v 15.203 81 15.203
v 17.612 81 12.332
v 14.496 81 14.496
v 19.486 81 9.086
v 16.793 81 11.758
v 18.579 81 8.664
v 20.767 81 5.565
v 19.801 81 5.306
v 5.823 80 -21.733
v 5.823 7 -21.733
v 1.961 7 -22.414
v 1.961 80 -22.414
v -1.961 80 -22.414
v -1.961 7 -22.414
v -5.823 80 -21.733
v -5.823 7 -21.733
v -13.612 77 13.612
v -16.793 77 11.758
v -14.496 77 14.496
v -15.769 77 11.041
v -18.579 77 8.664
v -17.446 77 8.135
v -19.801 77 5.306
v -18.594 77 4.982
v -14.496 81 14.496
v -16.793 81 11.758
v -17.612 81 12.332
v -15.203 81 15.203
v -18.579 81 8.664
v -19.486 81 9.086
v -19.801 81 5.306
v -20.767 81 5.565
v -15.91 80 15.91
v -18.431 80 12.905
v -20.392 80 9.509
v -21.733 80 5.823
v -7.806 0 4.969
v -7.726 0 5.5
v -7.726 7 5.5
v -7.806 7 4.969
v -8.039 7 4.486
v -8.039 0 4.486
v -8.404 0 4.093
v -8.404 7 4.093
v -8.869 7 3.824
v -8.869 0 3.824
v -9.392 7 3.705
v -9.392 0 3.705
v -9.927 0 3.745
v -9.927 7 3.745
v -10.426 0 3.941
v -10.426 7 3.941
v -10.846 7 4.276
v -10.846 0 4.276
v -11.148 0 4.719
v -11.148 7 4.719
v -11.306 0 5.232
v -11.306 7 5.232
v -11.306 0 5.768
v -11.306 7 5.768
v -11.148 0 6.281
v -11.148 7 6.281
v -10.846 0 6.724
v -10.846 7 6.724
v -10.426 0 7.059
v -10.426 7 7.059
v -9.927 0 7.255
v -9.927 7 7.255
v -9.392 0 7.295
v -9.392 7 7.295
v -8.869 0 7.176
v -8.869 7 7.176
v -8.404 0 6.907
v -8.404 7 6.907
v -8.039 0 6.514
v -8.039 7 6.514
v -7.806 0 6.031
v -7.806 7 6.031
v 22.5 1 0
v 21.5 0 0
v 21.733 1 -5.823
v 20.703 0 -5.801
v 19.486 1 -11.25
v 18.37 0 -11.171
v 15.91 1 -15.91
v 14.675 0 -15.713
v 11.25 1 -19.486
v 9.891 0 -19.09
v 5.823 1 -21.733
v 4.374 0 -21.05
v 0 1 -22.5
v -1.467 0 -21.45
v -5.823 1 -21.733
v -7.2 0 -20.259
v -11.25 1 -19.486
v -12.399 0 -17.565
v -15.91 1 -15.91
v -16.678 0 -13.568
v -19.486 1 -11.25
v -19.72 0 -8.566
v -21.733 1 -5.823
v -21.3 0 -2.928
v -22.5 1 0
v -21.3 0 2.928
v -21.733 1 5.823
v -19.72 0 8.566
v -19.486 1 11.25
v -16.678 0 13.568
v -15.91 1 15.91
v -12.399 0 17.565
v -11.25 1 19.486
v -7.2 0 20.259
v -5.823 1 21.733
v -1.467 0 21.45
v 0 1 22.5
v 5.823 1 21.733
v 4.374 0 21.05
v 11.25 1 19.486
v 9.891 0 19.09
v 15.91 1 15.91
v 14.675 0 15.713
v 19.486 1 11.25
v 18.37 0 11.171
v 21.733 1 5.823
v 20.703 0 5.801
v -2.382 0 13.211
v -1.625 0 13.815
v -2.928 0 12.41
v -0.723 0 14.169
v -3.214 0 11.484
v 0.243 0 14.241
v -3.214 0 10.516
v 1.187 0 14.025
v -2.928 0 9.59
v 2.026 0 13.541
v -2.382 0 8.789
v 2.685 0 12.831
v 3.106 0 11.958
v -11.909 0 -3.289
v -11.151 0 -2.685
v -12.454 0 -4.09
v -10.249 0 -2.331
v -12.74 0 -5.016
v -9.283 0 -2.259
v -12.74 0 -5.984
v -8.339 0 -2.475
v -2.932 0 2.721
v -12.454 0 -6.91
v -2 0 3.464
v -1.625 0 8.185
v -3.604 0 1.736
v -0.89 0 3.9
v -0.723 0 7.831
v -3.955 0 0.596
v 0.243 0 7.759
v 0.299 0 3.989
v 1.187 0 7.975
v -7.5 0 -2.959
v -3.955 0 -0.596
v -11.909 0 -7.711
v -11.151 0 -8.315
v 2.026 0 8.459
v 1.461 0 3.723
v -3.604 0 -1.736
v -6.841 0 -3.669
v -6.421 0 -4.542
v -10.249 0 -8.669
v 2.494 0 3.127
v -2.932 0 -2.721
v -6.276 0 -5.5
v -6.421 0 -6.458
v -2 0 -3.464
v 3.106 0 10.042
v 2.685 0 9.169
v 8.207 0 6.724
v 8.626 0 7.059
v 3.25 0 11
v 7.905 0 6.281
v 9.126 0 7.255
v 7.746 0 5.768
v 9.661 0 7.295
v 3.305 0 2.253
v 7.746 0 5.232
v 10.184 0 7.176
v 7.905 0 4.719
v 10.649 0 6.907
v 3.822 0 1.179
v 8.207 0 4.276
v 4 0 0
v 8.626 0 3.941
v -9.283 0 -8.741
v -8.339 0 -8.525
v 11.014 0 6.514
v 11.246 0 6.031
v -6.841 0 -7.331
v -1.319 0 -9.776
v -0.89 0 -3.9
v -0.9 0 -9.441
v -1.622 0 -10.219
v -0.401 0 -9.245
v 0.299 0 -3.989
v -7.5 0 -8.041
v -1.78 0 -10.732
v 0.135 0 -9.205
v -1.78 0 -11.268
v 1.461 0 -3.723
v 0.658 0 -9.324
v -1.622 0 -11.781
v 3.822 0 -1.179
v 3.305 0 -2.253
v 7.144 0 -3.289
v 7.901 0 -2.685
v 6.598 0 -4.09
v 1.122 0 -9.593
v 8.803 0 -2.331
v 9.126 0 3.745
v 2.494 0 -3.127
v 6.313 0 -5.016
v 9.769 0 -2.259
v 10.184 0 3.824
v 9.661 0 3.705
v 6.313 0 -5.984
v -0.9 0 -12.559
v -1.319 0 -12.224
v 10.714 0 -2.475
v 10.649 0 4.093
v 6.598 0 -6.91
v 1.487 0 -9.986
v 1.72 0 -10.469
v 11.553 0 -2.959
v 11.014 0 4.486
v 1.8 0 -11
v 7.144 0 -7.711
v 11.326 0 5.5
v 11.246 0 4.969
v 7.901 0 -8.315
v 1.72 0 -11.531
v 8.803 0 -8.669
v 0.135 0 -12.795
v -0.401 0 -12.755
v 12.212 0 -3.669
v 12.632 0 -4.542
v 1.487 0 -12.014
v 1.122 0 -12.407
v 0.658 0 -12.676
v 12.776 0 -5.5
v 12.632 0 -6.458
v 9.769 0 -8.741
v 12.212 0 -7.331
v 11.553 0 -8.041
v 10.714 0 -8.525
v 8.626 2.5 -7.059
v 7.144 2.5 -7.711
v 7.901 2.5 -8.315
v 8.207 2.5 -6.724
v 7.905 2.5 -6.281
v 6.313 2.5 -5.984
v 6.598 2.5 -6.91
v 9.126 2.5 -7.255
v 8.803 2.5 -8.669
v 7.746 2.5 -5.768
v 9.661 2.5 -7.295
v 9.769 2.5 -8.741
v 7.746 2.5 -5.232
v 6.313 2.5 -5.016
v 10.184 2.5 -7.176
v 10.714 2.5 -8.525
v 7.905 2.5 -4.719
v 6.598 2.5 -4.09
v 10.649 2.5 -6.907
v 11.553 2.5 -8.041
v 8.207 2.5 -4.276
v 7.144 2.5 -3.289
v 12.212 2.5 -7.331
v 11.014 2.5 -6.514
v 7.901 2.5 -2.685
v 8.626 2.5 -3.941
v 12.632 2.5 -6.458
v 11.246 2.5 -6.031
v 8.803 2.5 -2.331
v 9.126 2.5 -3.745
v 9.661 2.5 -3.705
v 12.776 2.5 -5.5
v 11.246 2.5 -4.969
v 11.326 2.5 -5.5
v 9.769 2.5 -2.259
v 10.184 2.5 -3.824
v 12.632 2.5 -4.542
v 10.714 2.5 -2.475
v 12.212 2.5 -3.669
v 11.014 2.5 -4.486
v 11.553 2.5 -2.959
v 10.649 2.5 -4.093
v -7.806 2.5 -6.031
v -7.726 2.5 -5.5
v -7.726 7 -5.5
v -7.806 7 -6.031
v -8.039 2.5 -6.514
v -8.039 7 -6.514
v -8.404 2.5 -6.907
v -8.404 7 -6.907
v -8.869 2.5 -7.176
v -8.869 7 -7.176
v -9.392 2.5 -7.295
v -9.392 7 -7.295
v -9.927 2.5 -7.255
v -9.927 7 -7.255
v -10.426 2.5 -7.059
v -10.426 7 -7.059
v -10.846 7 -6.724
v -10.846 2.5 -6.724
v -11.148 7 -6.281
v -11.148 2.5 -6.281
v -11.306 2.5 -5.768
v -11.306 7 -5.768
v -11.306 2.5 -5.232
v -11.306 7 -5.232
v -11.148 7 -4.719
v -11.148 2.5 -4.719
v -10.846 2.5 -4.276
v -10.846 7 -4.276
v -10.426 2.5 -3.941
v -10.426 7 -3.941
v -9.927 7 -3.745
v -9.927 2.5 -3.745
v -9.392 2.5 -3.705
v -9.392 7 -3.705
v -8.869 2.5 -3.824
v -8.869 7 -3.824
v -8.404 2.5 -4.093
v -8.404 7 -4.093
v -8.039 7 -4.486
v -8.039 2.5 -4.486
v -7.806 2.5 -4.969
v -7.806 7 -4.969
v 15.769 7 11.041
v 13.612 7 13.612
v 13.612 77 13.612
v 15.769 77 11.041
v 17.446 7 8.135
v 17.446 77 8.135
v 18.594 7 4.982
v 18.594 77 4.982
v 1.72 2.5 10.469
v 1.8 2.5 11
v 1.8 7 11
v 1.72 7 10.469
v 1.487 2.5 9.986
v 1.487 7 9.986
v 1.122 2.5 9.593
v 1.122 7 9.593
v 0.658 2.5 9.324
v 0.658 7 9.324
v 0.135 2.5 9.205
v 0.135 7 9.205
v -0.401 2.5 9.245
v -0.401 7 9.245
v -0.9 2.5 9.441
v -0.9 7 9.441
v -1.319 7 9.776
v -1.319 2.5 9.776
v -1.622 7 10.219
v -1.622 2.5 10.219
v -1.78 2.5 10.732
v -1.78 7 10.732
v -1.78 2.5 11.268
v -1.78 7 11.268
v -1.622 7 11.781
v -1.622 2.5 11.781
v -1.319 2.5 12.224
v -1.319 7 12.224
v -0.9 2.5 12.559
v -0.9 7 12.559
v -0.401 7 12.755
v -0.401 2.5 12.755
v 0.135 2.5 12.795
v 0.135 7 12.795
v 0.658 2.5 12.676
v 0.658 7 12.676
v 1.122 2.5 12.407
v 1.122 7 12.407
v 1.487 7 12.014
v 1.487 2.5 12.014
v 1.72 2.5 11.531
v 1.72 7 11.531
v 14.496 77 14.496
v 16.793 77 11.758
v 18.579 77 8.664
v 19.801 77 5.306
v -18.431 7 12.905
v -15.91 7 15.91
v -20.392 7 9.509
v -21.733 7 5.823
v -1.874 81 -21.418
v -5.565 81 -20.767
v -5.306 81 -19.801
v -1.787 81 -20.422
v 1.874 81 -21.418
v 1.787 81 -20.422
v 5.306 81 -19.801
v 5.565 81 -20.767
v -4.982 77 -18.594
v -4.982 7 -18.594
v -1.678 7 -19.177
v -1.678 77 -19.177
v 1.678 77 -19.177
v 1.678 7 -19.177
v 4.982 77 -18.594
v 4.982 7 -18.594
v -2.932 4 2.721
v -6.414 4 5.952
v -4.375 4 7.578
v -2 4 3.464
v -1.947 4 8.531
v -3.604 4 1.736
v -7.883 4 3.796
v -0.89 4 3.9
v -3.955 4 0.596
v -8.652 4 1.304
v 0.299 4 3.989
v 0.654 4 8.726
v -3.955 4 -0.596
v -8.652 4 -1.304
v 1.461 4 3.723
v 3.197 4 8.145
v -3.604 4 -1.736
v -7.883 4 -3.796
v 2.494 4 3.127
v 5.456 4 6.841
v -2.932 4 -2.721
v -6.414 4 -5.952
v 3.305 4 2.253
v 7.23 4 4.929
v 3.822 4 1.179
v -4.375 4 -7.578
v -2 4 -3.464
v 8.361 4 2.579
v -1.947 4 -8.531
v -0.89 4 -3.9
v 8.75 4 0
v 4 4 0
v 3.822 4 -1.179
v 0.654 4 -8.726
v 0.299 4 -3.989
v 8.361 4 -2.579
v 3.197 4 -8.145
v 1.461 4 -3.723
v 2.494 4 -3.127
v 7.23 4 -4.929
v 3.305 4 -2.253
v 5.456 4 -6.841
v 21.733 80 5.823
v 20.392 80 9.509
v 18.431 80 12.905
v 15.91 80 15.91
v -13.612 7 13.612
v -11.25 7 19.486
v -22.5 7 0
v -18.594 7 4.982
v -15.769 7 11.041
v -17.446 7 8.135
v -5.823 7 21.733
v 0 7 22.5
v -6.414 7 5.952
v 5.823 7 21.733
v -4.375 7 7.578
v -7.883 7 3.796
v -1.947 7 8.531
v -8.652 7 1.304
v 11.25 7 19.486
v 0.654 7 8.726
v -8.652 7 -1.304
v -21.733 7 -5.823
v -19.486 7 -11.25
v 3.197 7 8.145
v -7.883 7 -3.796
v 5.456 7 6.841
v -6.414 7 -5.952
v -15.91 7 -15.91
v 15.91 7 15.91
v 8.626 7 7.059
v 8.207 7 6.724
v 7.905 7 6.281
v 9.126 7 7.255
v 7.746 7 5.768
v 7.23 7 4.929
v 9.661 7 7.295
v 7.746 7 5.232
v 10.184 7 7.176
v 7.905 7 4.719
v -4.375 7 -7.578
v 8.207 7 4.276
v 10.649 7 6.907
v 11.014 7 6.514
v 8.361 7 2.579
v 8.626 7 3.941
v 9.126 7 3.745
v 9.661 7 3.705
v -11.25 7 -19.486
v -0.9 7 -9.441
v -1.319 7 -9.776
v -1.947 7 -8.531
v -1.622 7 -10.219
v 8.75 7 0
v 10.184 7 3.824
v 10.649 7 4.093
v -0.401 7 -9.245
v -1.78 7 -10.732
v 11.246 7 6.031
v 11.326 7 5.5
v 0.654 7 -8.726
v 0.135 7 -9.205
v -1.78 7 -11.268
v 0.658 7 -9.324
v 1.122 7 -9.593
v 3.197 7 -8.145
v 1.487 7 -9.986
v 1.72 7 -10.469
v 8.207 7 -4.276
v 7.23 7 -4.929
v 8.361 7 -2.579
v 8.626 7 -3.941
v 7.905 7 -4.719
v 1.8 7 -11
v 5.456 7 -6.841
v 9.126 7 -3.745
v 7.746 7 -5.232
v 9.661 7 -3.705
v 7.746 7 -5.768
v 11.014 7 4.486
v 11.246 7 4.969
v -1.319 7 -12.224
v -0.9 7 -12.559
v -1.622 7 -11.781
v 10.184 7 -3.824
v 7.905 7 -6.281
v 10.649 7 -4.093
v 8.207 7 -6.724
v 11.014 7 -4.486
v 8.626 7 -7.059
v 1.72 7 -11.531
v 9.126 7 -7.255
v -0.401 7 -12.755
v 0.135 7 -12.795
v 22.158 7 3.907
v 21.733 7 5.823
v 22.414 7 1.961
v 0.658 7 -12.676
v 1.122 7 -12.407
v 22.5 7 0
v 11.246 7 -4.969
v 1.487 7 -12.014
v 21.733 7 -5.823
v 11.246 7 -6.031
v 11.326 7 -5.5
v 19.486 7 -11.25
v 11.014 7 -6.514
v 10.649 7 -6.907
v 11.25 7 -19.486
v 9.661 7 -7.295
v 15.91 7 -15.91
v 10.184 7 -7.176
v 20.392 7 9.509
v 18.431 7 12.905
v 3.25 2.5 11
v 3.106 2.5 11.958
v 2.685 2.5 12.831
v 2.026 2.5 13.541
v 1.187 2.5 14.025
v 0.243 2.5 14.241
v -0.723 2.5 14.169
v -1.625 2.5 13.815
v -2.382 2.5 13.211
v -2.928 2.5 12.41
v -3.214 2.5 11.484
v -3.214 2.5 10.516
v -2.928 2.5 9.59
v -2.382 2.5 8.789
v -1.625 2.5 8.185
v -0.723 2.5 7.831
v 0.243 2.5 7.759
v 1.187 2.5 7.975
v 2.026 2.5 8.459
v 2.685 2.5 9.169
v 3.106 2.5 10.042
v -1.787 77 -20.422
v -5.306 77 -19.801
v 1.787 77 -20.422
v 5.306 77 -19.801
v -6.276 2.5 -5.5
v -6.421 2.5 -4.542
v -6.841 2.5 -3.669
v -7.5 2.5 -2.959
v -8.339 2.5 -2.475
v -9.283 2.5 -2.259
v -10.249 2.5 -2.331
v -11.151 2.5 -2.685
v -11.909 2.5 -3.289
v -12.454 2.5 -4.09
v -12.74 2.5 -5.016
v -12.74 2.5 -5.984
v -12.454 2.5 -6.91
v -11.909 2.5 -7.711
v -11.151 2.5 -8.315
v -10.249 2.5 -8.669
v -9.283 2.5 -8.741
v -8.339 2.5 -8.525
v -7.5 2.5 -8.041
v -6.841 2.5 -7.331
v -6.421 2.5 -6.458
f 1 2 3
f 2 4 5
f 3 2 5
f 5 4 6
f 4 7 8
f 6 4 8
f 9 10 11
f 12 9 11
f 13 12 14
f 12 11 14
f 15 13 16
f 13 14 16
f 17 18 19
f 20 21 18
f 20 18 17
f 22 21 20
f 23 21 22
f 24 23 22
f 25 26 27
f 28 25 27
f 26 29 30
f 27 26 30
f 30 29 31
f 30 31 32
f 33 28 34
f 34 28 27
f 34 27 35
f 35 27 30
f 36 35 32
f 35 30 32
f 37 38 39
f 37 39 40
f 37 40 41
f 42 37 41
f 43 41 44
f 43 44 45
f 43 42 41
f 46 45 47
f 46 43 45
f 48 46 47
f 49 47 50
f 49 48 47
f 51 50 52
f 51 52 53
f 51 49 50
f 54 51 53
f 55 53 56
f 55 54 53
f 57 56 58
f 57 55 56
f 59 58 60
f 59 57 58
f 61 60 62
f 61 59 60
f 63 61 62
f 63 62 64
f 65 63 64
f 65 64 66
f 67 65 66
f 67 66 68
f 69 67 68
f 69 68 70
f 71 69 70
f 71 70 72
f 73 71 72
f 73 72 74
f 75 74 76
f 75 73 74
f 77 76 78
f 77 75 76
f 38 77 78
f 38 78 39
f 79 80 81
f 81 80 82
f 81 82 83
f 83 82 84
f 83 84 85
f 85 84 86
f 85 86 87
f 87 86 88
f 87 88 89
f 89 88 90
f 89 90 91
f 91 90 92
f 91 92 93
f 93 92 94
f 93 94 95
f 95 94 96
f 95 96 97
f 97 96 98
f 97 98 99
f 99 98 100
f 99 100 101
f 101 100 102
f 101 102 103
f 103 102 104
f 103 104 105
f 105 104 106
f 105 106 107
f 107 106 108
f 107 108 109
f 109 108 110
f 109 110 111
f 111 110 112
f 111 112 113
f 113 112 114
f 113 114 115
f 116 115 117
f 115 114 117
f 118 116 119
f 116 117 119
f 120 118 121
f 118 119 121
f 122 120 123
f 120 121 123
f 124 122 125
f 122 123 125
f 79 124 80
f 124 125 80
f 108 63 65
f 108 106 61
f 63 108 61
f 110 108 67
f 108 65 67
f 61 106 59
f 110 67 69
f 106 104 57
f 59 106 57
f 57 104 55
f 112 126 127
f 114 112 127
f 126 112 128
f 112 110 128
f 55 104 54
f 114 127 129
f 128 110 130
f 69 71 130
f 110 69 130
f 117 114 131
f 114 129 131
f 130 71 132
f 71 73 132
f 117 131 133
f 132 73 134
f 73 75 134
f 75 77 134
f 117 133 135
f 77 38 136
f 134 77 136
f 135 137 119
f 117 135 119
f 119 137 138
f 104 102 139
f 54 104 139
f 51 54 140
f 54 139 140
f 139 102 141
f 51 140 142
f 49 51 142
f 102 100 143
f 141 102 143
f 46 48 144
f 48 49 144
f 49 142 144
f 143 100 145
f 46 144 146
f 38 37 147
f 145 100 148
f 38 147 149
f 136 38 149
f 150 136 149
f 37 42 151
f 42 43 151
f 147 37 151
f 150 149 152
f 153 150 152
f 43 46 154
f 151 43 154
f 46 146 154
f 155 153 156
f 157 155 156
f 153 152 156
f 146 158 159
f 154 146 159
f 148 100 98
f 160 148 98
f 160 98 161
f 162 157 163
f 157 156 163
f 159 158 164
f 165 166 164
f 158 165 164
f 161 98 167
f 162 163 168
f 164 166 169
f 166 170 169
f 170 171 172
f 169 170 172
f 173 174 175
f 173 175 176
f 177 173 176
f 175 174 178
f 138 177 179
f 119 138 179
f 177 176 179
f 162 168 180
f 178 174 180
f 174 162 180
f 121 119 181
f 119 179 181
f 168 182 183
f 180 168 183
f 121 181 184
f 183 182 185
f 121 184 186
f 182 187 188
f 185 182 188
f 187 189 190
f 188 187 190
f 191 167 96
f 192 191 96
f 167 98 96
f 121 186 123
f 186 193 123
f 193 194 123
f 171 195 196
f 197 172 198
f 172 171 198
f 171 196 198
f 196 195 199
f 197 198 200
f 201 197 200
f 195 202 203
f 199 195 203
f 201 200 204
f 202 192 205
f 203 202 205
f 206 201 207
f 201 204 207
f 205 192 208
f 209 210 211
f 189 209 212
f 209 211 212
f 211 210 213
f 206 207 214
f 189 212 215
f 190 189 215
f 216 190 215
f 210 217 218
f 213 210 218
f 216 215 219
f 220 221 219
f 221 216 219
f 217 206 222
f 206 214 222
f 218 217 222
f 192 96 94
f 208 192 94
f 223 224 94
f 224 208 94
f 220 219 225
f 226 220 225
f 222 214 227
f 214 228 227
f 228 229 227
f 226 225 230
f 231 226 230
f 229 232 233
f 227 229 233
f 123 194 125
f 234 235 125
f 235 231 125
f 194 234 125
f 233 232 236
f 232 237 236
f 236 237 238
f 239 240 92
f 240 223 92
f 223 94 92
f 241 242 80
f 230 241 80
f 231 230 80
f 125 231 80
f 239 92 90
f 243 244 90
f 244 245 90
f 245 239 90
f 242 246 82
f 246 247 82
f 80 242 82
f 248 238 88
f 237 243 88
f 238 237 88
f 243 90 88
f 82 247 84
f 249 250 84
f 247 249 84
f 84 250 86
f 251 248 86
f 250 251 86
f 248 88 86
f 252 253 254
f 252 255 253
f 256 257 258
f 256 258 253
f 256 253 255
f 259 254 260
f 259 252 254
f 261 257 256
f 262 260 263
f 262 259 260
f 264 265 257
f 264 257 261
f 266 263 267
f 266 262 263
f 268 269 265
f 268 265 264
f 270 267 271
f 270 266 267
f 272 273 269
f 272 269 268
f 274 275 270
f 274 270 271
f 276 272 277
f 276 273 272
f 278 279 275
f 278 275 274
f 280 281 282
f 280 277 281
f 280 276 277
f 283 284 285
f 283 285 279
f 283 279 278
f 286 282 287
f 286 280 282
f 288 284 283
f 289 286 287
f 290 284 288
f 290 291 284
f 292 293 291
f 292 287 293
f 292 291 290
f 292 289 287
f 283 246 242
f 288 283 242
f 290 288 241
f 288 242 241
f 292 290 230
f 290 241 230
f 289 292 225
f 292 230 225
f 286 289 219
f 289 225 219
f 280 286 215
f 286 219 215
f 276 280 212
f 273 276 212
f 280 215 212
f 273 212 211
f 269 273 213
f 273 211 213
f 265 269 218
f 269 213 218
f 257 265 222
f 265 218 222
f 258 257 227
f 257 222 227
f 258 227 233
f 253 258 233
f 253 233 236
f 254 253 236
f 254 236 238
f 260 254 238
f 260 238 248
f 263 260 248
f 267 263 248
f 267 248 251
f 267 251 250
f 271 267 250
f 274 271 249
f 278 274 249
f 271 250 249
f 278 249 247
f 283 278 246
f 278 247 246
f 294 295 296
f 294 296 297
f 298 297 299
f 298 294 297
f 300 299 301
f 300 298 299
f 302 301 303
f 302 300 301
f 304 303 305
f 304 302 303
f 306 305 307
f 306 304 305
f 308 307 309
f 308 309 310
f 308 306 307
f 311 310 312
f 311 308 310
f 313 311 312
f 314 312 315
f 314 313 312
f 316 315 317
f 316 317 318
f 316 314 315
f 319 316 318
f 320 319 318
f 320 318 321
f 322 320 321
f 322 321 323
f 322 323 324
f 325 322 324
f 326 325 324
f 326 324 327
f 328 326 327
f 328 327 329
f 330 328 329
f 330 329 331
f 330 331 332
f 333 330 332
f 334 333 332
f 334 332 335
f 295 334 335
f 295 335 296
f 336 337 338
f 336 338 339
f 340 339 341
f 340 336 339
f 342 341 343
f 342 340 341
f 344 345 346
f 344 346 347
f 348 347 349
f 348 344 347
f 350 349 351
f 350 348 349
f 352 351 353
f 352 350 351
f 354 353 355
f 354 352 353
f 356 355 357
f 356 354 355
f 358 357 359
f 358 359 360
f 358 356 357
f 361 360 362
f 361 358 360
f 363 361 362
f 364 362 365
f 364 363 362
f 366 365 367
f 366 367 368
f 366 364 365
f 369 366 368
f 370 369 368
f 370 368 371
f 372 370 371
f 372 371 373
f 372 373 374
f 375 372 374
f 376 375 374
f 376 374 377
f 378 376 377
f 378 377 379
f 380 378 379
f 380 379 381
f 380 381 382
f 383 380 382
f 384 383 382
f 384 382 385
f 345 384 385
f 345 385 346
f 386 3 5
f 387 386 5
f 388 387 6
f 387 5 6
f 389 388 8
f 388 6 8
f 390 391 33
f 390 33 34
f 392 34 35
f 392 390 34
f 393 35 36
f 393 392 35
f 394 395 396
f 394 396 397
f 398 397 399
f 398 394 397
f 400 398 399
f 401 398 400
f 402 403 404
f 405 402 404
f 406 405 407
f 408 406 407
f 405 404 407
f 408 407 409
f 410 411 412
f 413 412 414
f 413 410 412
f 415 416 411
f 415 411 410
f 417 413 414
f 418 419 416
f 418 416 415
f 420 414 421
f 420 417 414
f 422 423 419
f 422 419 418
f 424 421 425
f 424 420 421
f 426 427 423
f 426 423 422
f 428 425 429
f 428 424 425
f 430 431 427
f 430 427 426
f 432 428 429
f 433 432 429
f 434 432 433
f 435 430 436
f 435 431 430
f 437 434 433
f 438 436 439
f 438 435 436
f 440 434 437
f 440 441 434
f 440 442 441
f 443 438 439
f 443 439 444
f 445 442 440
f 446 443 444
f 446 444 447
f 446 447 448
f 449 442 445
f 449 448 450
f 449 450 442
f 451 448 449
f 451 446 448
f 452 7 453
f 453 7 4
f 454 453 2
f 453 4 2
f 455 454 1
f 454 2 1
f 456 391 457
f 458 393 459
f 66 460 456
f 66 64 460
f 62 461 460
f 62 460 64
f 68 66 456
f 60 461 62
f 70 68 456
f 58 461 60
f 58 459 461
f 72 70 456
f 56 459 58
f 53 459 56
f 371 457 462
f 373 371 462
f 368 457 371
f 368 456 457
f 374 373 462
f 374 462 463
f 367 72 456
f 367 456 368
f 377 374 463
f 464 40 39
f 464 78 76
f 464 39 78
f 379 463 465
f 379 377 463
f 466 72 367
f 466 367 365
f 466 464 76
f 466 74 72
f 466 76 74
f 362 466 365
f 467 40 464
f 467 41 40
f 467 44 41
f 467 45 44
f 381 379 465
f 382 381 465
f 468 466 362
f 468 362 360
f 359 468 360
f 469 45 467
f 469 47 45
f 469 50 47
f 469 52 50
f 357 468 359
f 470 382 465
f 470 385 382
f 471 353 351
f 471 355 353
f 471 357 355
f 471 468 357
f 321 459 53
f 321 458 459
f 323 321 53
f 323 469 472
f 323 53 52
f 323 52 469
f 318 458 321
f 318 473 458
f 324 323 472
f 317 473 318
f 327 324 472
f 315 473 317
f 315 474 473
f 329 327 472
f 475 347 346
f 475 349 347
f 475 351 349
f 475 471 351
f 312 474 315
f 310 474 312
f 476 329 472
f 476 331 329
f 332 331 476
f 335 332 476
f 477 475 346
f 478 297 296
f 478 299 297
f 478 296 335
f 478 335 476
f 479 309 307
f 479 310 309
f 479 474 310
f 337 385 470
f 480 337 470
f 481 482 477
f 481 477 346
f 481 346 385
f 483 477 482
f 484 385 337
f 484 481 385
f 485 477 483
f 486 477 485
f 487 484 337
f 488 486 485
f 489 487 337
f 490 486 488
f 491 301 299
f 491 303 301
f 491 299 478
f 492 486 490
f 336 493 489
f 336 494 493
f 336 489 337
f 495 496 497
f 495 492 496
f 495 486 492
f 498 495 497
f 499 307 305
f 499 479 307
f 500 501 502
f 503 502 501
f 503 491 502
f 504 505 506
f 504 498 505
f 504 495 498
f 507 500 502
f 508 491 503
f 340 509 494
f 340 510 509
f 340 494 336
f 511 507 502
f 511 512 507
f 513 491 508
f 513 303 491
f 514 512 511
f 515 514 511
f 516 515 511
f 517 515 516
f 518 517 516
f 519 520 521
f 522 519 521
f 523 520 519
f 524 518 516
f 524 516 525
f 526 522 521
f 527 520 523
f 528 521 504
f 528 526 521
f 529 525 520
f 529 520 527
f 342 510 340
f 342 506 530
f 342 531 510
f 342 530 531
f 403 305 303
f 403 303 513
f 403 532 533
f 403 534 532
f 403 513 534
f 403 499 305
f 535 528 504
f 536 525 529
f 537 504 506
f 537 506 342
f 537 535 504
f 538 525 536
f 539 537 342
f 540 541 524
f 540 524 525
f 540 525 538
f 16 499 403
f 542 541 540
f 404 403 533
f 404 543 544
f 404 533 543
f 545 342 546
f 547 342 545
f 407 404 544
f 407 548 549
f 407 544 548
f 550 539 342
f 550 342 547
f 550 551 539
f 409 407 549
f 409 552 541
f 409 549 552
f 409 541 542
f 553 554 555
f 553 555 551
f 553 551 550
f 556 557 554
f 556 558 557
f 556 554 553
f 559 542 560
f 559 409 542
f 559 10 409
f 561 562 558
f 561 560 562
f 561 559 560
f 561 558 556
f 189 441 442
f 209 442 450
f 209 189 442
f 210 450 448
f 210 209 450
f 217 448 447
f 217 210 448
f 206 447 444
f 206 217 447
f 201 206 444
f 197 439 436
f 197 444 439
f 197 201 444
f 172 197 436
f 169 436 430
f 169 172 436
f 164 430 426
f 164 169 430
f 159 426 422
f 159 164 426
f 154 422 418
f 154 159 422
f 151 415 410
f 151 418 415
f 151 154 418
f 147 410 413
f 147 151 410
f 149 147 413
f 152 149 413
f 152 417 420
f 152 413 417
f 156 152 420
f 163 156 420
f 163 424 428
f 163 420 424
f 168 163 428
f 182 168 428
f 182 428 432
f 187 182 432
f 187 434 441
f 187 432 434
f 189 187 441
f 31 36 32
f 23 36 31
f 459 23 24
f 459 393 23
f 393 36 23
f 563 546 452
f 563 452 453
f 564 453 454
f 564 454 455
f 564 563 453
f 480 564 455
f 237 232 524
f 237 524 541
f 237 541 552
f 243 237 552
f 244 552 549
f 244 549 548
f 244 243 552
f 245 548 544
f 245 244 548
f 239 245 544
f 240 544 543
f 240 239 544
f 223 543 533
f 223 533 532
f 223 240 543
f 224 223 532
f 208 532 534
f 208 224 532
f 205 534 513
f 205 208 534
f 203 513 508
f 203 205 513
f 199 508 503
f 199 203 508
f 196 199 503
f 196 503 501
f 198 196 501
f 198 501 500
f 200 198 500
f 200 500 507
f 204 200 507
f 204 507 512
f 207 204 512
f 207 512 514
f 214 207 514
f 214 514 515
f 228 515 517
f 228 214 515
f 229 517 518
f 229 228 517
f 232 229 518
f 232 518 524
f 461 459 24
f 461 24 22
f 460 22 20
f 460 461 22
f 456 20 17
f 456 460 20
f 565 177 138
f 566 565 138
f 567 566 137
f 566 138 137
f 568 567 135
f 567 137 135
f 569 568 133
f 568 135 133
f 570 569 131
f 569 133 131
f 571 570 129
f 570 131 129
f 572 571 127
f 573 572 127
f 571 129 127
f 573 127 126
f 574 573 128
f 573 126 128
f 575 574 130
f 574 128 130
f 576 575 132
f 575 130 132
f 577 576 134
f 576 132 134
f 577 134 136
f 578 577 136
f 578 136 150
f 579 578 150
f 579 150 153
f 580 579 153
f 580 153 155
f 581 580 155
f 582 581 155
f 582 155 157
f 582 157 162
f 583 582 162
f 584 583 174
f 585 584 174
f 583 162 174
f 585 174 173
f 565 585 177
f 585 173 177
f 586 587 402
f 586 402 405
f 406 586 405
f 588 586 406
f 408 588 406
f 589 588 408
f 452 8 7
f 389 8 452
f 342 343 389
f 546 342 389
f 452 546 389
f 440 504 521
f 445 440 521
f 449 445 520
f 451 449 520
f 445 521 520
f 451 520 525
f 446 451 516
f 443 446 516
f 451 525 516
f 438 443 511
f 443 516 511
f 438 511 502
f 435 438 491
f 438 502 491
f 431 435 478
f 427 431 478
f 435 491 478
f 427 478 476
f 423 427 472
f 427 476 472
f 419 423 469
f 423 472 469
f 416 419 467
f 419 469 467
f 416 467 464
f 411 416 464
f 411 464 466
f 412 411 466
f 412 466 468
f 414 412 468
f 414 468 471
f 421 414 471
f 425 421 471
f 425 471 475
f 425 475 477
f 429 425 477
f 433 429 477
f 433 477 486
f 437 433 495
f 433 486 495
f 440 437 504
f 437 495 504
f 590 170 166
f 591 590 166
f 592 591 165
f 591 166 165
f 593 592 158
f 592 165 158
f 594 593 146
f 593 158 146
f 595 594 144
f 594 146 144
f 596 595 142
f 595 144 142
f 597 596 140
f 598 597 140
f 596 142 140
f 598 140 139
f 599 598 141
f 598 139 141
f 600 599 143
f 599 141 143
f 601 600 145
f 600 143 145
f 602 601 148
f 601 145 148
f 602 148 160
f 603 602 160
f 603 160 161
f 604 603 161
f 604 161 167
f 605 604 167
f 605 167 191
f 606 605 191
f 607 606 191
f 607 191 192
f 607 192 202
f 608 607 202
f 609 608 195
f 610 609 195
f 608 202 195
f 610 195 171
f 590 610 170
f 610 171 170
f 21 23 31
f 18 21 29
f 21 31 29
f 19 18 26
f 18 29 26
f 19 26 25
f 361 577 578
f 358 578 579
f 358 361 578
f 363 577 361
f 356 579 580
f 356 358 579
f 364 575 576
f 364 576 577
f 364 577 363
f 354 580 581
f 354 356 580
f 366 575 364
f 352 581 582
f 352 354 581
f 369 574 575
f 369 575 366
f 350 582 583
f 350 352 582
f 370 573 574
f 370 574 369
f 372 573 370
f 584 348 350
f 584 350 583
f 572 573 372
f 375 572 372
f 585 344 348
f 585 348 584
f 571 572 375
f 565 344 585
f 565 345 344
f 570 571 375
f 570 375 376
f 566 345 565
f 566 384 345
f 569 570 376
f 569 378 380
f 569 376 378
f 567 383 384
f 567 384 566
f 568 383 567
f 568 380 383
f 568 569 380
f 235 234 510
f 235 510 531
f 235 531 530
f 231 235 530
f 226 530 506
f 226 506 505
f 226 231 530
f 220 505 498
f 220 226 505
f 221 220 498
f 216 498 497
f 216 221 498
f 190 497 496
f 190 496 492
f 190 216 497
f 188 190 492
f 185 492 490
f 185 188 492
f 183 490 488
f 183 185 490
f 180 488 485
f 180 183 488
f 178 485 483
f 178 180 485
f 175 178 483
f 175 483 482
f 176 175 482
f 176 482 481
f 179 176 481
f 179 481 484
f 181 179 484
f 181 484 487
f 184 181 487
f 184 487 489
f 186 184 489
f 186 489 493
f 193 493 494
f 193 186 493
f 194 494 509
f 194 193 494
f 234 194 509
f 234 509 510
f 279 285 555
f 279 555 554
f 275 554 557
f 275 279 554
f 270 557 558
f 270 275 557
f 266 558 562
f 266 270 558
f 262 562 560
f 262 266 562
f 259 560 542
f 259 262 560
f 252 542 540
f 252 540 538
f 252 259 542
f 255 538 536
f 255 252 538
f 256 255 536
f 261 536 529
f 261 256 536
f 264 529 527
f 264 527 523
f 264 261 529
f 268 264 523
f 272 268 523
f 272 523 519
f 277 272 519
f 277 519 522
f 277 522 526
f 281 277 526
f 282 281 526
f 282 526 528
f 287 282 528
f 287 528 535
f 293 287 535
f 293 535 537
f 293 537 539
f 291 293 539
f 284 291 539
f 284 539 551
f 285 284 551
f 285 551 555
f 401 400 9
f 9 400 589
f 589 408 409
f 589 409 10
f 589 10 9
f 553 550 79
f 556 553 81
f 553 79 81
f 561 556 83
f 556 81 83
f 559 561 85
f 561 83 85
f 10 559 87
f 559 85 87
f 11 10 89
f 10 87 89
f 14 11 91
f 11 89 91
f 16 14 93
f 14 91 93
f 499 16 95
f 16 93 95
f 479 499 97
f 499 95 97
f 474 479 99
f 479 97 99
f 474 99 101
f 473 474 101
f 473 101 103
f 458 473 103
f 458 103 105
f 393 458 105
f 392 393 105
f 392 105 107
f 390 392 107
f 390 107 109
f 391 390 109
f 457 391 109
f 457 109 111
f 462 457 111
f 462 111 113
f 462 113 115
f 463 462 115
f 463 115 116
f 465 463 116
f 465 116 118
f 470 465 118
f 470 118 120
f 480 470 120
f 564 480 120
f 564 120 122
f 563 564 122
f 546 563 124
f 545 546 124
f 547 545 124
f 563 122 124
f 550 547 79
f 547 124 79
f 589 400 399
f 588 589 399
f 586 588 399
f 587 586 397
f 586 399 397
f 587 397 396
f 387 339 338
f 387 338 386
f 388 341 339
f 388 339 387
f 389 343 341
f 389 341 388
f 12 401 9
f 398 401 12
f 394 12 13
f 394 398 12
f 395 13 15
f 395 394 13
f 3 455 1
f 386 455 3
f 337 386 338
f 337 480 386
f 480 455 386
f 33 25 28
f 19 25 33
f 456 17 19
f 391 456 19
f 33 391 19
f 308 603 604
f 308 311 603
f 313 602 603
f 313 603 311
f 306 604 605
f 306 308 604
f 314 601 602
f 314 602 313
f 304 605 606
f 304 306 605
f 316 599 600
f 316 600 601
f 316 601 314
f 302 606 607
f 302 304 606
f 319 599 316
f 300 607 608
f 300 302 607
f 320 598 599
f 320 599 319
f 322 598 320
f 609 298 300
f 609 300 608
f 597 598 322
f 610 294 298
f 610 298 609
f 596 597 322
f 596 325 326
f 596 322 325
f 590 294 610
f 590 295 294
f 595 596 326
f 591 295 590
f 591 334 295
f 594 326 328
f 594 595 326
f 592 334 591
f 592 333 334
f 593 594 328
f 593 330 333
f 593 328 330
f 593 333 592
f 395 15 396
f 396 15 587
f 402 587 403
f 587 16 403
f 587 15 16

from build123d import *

# Parameters (mm, degrees)
SKETCH1_R           = 22.5
SKETCH1_R_2         = 1.8
SKETCH1_R_3         = 4
BOSS_EXTRUDE1_DEPTH = 7
SKETCH4_R           = 8.75
CUT_EXTRUDE2_DEPTH  = 3
SKETCH6_R           = 3.25
CUT_EXTRUDE3_DEPTH  = 2.5
BOSS_EXTRUDE2_DEPTH = 74
SKETCH7_R           = 20.5
CUT_EXTRUDE4_DEPTH  = 4
CHAMFER2_SIZE       = 1


with BuildPart() as part:
    # Sketch1 → Boss-Extrude1 (new body)
    with BuildSketch(Plane(origin=(0, 0, 0), x_dir=(1, 0, 0), z_dir=(0, 1, 0))):
        Circle(SKETCH1_R)
        with Locations((0, 11)):
            Circle(SKETCH1_R_2, mode=Mode.SUBTRACT)
        with Locations((9.526279442, 5.5)):
            Circle(SKETCH1_R_2, mode=Mode.SUBTRACT)
        with Locations((9.526279442, -5.5)):
            Circle(SKETCH1_R_2, mode=Mode.SUBTRACT)
        with Locations((0, -11)):
            Circle(SKETCH1_R_2, mode=Mode.SUBTRACT)
        with Locations((-9.526279442, -5.5)):
            Circle(SKETCH1_R_2, mode=Mode.SUBTRACT)
        with Locations((-9.526279442, 5.5)):
            Circle(SKETCH1_R_2, mode=Mode.SUBTRACT)
        Circle(SKETCH1_R_3, mode=Mode.SUBTRACT)
    extrude(amount=BOSS_EXTRUDE1_DEPTH)

    # Sketch4 → Cut-Extrude2 (cut)
    with BuildSketch(Plane(origin=(0, 7, 0), x_dir=(1, 0, 0), z_dir=(0, 1, 0))):
        Circle(SKETCH4_R)
    extrude(amount=-CUT_EXTRUDE2_DEPTH, mode=Mode.SUBTRACT)

    # Sketch6 → Cut-Extrude3 (cut)
    with BuildSketch(Plane.XZ):
        with Locations((0, 11)):
            Circle(SKETCH6_R)
        with Locations((9.526279442, -5.5)):
            Circle(SKETCH6_R)
        with Locations((-9.526279442, -5.5)):
            Circle(SKETCH6_R)
    extrude(amount=-CUT_EXTRUDE3_DEPTH, mode=Mode.SUBTRACT)

    # Sketch2 → Boss-Extrude2 (add)
    with BuildSketch(Plane(origin=(0, 7, 0), x_dir=(1, 0, 0), z_dir=(0, 1, 0))):
        with BuildLine():
            Line((4.982266618, 18.594072156), (5.823428515, 21.733331092))
            ThreePointArc((5.823428515, 21.733331092), (0, 22.5), (-5.823428515, 21.733331092))
            Line((-5.823428515, 21.733331092), (-4.982266618, 18.594072156))
            ThreePointArc((-4.982266618, 18.594072156), (0, 19.25), (4.982266618, 18.594072156))
        make_face()
        with BuildLine():
            Line((18.594072156, -4.982266618), (21.733331092, -5.823428515))
            ThreePointArc((21.733331092, -5.823428515), (19.485571585, -11.25), (15.909902577, -15.909902577))
            Line((15.909902577, -15.909902577), (13.611805538, -13.611805538))
            ThreePointArc((13.611805538, -13.611805538), (16.670989023, -9.625), (18.594072156, -4.982266618))
        make_face()
        with BuildLine():
            Line((-13.611805538, -13.611805538), (-15.909902577, -15.909902577))
            ThreePointArc((-15.909902577, -15.909902577), (-19.485571585, -11.25), (-21.733331092, -5.823428515))
            Line((-21.733331092, -5.823428515), (-18.594072156, -4.982266618))
            ThreePointArc((-18.594072156, -4.982266618), (-16.670989023, -9.625), (-13.611805538, -13.611805538))
        make_face()
    extrude(amount=BOSS_EXTRUDE2_DEPTH)

    # Sketch7 → Cut-Extrude4 (cut)
    with BuildSketch(Plane(origin=(0, 81, 0), x_dir=(1, 0, 0), z_dir=(0, 1, 0))):
        Circle(SKETCH7_R)
    extrude(amount=-CUT_EXTRUDE4_DEPTH, mode=Mode.SUBTRACT)

    # Chamfer2
    chamfer2_edges = [part.edges().sort_by_distance(p)[0] for p in [
        (-22.5, 0, 0),
        (19.485571585, 81, 11.25),
        (0, 81, -22.5),
        (-19.485571585, 81, 11.25),
    ]]
    chamfer(chamfer2_edges, length=CHAMFER2_SIZE)


solid = part.part
